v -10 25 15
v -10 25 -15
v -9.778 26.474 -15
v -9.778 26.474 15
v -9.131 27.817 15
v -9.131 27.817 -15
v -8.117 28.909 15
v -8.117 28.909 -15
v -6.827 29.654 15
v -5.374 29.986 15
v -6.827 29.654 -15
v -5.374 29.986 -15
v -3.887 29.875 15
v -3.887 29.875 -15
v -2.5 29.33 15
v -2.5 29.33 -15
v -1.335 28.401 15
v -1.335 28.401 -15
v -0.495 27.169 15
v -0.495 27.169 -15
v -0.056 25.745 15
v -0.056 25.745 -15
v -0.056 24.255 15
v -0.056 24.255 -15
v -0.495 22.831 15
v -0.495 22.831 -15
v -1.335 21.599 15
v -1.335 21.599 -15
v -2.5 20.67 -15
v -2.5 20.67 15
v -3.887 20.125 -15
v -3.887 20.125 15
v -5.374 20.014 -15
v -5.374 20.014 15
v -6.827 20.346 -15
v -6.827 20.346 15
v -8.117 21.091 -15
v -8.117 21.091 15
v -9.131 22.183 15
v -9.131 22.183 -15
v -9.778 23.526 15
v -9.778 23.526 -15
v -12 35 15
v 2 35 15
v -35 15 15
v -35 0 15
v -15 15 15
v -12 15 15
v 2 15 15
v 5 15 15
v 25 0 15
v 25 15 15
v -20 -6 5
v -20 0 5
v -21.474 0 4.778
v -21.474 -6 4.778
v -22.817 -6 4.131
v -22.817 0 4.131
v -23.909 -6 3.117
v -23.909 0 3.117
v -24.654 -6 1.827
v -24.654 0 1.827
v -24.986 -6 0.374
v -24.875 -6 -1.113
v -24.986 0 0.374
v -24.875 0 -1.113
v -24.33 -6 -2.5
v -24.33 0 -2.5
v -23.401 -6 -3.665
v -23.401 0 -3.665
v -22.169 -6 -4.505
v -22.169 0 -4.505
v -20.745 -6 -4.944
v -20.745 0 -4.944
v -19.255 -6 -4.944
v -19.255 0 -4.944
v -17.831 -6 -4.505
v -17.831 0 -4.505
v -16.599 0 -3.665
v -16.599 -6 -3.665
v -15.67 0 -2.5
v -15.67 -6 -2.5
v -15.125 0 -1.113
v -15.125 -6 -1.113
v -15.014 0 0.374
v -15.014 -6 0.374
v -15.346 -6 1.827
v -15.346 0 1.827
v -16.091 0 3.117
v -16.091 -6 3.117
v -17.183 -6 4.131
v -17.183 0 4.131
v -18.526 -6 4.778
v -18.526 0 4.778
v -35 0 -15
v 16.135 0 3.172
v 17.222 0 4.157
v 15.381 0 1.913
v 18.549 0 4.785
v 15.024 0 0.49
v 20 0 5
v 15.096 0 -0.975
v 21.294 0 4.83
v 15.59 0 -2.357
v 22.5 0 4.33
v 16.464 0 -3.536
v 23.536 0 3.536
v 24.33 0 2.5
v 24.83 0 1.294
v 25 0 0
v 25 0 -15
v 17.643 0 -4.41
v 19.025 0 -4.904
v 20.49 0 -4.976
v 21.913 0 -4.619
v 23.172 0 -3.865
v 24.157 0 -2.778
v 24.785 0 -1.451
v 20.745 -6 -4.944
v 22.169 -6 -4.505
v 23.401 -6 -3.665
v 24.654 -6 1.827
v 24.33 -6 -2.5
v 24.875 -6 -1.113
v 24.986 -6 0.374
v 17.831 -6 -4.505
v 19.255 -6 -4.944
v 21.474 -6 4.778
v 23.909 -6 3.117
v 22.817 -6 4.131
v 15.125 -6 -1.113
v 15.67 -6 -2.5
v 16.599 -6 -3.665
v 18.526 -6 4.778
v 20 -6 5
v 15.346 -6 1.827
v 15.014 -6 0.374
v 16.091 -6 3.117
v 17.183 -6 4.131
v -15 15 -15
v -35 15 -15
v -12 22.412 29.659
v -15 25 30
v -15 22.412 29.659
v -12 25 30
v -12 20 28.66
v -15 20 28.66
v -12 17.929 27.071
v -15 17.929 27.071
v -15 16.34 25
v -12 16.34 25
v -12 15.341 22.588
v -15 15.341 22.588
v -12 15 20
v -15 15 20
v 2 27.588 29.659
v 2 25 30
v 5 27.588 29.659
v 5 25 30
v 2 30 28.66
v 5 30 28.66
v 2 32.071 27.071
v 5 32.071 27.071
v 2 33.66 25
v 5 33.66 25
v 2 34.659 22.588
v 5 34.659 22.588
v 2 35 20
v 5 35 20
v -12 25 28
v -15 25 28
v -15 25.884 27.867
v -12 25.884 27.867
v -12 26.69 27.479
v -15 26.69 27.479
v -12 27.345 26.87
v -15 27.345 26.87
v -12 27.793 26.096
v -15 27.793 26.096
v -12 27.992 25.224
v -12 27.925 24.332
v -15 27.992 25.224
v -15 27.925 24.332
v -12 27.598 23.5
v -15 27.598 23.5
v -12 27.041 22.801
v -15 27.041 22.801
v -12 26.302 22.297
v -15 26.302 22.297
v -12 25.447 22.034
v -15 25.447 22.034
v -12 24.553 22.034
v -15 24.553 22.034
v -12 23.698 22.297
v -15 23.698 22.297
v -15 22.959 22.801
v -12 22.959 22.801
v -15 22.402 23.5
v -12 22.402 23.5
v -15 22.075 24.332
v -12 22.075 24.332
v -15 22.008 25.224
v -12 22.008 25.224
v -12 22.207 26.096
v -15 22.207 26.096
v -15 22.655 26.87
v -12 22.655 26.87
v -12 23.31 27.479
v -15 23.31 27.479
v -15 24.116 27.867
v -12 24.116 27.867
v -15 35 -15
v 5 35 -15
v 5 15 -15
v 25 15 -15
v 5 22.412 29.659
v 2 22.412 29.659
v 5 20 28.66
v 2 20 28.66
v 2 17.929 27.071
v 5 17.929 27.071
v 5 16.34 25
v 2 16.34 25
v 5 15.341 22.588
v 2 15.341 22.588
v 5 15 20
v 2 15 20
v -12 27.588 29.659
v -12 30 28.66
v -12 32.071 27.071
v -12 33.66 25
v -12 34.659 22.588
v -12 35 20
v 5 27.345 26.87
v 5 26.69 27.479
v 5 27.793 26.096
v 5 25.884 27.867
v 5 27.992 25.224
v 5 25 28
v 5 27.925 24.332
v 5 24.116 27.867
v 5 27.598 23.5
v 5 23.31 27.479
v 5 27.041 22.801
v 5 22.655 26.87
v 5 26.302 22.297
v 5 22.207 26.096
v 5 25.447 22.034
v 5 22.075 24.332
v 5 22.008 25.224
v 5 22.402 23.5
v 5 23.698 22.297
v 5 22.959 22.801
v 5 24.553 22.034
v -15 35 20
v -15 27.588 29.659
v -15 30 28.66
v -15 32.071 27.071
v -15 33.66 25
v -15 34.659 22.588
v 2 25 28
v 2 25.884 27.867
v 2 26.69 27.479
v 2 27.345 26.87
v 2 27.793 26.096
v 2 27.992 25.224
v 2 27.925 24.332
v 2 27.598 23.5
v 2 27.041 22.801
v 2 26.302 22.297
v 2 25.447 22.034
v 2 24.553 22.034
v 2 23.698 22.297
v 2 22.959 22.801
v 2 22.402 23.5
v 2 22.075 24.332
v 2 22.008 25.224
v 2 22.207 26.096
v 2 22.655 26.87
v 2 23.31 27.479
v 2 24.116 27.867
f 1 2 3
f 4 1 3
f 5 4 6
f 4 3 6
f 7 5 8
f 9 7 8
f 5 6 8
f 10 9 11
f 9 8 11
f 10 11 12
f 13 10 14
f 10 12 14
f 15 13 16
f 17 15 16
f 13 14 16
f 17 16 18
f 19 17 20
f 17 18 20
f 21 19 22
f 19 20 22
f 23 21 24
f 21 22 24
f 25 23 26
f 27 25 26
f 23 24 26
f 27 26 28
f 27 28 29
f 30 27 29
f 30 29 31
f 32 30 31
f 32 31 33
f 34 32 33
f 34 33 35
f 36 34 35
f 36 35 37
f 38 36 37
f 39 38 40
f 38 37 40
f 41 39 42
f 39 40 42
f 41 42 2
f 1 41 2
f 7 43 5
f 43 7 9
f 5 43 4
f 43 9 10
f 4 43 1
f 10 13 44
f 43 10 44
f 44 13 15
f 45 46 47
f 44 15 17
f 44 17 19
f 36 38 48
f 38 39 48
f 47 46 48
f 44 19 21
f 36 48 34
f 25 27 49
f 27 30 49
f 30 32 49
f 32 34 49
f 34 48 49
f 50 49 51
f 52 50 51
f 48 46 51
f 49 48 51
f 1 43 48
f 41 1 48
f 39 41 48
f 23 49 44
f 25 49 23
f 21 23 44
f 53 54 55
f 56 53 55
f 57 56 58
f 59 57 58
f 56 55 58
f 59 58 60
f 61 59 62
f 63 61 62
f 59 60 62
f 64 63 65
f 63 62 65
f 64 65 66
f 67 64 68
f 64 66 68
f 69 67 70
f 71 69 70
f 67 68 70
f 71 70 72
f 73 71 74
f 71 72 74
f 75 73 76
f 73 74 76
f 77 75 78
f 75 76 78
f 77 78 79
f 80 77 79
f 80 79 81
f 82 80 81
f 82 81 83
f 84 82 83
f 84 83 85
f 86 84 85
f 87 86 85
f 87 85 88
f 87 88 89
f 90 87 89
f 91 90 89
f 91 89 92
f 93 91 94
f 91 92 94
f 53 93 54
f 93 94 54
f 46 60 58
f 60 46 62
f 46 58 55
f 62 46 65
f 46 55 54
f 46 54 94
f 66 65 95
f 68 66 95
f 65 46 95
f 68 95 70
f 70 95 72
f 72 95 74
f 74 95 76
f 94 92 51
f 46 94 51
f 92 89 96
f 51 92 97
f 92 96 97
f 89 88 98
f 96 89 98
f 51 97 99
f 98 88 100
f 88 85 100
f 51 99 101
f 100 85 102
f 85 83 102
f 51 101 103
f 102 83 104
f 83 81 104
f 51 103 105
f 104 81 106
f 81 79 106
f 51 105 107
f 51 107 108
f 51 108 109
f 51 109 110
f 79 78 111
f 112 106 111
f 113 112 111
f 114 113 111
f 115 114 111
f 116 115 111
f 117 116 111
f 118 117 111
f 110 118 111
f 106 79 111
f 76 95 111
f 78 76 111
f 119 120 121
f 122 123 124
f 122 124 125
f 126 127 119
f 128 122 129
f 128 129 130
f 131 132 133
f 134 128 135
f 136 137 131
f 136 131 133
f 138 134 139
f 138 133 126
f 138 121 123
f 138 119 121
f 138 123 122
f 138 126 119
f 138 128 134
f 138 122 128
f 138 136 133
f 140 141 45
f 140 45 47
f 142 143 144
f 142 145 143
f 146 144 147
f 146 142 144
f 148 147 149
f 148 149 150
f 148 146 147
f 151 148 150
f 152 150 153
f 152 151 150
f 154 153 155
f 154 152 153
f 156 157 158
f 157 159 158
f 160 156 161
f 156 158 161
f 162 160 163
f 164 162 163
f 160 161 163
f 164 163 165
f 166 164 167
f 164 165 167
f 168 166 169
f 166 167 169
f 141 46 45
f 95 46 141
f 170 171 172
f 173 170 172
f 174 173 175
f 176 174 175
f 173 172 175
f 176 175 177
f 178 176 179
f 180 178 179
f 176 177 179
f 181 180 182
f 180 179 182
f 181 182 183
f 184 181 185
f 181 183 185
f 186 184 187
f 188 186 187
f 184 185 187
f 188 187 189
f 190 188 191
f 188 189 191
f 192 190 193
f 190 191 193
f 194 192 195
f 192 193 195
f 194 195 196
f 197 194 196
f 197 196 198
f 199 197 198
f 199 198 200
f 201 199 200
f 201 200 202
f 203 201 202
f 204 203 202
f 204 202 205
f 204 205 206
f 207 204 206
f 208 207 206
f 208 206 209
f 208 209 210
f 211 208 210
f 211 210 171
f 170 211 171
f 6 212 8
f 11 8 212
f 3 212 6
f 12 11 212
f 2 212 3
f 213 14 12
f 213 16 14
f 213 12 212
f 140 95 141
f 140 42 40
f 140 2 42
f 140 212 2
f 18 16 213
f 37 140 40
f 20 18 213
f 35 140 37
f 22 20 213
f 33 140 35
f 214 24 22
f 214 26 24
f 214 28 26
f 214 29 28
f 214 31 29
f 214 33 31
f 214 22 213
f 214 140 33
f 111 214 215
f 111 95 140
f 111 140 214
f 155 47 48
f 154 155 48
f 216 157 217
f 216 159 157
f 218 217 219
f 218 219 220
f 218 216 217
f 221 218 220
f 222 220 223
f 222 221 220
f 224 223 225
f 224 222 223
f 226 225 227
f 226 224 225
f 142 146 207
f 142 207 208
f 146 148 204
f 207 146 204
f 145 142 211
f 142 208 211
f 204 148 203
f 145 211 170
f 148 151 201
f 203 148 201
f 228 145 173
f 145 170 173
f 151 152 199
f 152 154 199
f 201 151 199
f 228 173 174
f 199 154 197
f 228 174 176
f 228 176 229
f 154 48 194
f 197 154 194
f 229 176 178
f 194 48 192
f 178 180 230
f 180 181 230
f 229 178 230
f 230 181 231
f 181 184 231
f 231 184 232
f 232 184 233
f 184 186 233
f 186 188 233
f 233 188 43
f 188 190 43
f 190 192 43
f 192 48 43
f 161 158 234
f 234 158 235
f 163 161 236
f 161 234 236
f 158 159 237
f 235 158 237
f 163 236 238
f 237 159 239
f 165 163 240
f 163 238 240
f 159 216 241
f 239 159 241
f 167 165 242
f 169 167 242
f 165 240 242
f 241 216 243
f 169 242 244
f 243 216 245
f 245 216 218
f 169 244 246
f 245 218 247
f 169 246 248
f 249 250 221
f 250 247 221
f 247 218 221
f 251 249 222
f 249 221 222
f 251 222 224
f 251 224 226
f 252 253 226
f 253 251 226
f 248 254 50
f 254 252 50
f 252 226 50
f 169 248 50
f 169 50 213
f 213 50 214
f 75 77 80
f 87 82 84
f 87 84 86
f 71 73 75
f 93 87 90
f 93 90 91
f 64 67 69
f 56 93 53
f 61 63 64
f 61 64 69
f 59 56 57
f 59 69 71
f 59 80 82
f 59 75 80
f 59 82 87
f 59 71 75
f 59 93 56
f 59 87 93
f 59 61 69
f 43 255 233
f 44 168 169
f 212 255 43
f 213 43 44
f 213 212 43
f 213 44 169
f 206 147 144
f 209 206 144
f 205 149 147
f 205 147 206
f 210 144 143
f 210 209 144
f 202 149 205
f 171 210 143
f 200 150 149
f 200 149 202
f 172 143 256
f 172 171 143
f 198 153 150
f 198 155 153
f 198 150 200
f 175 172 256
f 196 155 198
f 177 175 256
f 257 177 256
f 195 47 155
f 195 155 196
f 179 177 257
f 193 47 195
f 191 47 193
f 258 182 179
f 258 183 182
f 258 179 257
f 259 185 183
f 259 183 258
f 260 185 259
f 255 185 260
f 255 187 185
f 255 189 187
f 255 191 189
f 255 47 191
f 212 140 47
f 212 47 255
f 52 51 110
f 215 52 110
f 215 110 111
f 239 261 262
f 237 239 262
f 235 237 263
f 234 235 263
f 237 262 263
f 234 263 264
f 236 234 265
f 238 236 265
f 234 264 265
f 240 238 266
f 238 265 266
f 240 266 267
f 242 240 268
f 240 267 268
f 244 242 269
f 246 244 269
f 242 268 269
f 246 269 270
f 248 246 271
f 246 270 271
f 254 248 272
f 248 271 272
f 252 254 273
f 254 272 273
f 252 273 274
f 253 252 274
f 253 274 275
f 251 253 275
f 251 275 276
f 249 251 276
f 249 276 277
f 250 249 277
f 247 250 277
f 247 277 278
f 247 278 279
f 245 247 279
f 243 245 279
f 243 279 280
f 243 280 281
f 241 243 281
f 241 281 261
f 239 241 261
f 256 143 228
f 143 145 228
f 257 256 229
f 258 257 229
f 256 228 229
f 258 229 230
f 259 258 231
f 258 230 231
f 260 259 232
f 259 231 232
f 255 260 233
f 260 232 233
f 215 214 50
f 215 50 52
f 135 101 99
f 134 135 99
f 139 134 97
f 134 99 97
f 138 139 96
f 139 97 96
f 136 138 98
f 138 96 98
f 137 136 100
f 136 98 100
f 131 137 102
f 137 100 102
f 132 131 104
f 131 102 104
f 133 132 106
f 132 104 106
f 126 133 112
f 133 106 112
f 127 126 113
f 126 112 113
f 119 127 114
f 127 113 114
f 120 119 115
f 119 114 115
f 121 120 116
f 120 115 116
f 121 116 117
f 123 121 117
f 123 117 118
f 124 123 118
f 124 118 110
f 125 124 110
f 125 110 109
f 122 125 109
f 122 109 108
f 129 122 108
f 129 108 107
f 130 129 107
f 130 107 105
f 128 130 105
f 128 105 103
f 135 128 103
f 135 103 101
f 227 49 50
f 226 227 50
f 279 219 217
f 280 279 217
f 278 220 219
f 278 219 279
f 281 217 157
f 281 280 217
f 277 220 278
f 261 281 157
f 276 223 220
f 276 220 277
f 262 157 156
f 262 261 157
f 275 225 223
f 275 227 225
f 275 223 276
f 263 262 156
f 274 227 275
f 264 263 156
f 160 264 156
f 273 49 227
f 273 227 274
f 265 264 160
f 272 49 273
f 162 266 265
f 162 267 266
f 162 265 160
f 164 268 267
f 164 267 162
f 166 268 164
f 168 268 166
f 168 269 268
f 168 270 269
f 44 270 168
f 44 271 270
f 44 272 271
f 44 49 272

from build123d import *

# Parameters (mm, degrees)
ESQUISSE2_W             = 60
ESQUISSE2_H             = 30
BOSS_EXTRU_1_DEPTH      = 15
ESQUISSE3_R             = 5
BOSS_EXTRU_2_DEPTH      = 6
BOSS_EXTRU_3_DEPTH      = 20
ESQUISSE5_R             = 5
ENL_V_MAT_EXTRU_1_DEPTH = 30
ESQUISSE6_W             = 3
ESQUISSE6_H             = 20
BOSS_EXTRU_4_DEPTH      = 15
CONG_2_R                = 10
CONG_3_R                = 10
CONG_4_R                = 10
CONG_5_R                = 10
ESQUISSE7_R             = 3
ENL_V_MAT_EXTRU_2_DEPTH = 27


with BuildPart() as part:
    # Esquisse2 → Boss.-Extru.1 (new body)
    with BuildSketch(Plane(origin=(0, 0, 0), x_dir=(1, 0, 0), z_dir=(0, 1, 0))):
        with Locations((-5, 0)):
            Rectangle(ESQUISSE2_W, ESQUISSE2_H)
    extrude(amount=BOSS_EXTRU_1_DEPTH)

    # Esquisse3 → Boss.-Extru.2 (add)
    with BuildSketch(Plane.XZ):
        with Locations(Location((-20, 0, 0), (0, 0, 90))):
            Circle(ESQUISSE3_R)
        with Locations(Location((20, 0, 0), (0, 0, 90))):
            Circle(ESQUISSE3_R)
    extrude(amount=BOSS_EXTRU_2_DEPTH)

    # Esquisse4 → Boss.-Extru.3 (add)
    with BuildSketch(Plane(origin=(0, 15, 0), x_dir=(1, 0, 0), z_dir=(0, 1, 0))):
        Polygon((-5, 15), (-15, 15), (-15, -15), (5, -15), (5, 15), align=None)
    extrude(amount=BOSS_EXTRU_3_DEPTH)

    # Esquisse5 → Enlèv. mat.-Extru.1 (cut)
    with BuildSketch(Plane(origin=(0, 0, -15), x_dir=(-1, 0, 0), z_dir=(0, 0, -1))):
        with Locations((5, 25)):
            Circle(ESQUISSE5_R)
    extrude(amount=-ENL_V_MAT_EXTRU_1_DEPTH, mode=Mode.SUBTRACT)

    # Esquisse6 → Boss.-Extru.4 (add)
    with BuildSketch(Plane.XY.offset(15)):
        with Locations((-13.5, 25)):
            Rectangle(ESQUISSE6_W, ESQUISSE6_H)
        with Locations((3.5, 25)):
            Rectangle(ESQUISSE6_W, ESQUISSE6_H)
    extrude(amount=BOSS_EXTRU_4_DEPTH)

    # Congé2
    cong_2_edges = [part.edges().sort_by_distance(p)[0] for p in [
        (3.5, 35, 30),
    ]]
    fillet(cong_2_edges, radius=CONG_2_R)

    # Congé3
    cong_3_edges = [part.edges().sort_by_distance(p)[0] for p in [
        (3.5, 15, 30),
    ]]
    fillet(cong_3_edges, radius=CONG_3_R - 0.0001)  # a hair under: the kernel refuses the full size

    # Congé4
    cong_4_edges = [part.edges().sort_by_distance(p)[0] for p in [
        (-13.5, 15, 30),
    ]]
    fillet(cong_4_edges, radius=CONG_4_R)

    # Congé5
    cong_5_edges = [part.edges().sort_by_distance(p)[0] for p in [
        (-13.5, 35, 30),
    ]]
    fillet(cong_5_edges, radius=CONG_5_R - 0.0001)  # a hair under: the kernel refuses the full size

    # Esquisse7 → Enlèv. mat.-Extru.2 (cut)
    with BuildSketch(Plane.ZY.offset(15)):
        with Locations((25, 25)):
            Circle(ESQUISSE7_R)
    extrude(amount=-ENL_V_MAT_EXTRU_2_DEPTH, mode=Mode.SUBTRACT)


solid = part.part
